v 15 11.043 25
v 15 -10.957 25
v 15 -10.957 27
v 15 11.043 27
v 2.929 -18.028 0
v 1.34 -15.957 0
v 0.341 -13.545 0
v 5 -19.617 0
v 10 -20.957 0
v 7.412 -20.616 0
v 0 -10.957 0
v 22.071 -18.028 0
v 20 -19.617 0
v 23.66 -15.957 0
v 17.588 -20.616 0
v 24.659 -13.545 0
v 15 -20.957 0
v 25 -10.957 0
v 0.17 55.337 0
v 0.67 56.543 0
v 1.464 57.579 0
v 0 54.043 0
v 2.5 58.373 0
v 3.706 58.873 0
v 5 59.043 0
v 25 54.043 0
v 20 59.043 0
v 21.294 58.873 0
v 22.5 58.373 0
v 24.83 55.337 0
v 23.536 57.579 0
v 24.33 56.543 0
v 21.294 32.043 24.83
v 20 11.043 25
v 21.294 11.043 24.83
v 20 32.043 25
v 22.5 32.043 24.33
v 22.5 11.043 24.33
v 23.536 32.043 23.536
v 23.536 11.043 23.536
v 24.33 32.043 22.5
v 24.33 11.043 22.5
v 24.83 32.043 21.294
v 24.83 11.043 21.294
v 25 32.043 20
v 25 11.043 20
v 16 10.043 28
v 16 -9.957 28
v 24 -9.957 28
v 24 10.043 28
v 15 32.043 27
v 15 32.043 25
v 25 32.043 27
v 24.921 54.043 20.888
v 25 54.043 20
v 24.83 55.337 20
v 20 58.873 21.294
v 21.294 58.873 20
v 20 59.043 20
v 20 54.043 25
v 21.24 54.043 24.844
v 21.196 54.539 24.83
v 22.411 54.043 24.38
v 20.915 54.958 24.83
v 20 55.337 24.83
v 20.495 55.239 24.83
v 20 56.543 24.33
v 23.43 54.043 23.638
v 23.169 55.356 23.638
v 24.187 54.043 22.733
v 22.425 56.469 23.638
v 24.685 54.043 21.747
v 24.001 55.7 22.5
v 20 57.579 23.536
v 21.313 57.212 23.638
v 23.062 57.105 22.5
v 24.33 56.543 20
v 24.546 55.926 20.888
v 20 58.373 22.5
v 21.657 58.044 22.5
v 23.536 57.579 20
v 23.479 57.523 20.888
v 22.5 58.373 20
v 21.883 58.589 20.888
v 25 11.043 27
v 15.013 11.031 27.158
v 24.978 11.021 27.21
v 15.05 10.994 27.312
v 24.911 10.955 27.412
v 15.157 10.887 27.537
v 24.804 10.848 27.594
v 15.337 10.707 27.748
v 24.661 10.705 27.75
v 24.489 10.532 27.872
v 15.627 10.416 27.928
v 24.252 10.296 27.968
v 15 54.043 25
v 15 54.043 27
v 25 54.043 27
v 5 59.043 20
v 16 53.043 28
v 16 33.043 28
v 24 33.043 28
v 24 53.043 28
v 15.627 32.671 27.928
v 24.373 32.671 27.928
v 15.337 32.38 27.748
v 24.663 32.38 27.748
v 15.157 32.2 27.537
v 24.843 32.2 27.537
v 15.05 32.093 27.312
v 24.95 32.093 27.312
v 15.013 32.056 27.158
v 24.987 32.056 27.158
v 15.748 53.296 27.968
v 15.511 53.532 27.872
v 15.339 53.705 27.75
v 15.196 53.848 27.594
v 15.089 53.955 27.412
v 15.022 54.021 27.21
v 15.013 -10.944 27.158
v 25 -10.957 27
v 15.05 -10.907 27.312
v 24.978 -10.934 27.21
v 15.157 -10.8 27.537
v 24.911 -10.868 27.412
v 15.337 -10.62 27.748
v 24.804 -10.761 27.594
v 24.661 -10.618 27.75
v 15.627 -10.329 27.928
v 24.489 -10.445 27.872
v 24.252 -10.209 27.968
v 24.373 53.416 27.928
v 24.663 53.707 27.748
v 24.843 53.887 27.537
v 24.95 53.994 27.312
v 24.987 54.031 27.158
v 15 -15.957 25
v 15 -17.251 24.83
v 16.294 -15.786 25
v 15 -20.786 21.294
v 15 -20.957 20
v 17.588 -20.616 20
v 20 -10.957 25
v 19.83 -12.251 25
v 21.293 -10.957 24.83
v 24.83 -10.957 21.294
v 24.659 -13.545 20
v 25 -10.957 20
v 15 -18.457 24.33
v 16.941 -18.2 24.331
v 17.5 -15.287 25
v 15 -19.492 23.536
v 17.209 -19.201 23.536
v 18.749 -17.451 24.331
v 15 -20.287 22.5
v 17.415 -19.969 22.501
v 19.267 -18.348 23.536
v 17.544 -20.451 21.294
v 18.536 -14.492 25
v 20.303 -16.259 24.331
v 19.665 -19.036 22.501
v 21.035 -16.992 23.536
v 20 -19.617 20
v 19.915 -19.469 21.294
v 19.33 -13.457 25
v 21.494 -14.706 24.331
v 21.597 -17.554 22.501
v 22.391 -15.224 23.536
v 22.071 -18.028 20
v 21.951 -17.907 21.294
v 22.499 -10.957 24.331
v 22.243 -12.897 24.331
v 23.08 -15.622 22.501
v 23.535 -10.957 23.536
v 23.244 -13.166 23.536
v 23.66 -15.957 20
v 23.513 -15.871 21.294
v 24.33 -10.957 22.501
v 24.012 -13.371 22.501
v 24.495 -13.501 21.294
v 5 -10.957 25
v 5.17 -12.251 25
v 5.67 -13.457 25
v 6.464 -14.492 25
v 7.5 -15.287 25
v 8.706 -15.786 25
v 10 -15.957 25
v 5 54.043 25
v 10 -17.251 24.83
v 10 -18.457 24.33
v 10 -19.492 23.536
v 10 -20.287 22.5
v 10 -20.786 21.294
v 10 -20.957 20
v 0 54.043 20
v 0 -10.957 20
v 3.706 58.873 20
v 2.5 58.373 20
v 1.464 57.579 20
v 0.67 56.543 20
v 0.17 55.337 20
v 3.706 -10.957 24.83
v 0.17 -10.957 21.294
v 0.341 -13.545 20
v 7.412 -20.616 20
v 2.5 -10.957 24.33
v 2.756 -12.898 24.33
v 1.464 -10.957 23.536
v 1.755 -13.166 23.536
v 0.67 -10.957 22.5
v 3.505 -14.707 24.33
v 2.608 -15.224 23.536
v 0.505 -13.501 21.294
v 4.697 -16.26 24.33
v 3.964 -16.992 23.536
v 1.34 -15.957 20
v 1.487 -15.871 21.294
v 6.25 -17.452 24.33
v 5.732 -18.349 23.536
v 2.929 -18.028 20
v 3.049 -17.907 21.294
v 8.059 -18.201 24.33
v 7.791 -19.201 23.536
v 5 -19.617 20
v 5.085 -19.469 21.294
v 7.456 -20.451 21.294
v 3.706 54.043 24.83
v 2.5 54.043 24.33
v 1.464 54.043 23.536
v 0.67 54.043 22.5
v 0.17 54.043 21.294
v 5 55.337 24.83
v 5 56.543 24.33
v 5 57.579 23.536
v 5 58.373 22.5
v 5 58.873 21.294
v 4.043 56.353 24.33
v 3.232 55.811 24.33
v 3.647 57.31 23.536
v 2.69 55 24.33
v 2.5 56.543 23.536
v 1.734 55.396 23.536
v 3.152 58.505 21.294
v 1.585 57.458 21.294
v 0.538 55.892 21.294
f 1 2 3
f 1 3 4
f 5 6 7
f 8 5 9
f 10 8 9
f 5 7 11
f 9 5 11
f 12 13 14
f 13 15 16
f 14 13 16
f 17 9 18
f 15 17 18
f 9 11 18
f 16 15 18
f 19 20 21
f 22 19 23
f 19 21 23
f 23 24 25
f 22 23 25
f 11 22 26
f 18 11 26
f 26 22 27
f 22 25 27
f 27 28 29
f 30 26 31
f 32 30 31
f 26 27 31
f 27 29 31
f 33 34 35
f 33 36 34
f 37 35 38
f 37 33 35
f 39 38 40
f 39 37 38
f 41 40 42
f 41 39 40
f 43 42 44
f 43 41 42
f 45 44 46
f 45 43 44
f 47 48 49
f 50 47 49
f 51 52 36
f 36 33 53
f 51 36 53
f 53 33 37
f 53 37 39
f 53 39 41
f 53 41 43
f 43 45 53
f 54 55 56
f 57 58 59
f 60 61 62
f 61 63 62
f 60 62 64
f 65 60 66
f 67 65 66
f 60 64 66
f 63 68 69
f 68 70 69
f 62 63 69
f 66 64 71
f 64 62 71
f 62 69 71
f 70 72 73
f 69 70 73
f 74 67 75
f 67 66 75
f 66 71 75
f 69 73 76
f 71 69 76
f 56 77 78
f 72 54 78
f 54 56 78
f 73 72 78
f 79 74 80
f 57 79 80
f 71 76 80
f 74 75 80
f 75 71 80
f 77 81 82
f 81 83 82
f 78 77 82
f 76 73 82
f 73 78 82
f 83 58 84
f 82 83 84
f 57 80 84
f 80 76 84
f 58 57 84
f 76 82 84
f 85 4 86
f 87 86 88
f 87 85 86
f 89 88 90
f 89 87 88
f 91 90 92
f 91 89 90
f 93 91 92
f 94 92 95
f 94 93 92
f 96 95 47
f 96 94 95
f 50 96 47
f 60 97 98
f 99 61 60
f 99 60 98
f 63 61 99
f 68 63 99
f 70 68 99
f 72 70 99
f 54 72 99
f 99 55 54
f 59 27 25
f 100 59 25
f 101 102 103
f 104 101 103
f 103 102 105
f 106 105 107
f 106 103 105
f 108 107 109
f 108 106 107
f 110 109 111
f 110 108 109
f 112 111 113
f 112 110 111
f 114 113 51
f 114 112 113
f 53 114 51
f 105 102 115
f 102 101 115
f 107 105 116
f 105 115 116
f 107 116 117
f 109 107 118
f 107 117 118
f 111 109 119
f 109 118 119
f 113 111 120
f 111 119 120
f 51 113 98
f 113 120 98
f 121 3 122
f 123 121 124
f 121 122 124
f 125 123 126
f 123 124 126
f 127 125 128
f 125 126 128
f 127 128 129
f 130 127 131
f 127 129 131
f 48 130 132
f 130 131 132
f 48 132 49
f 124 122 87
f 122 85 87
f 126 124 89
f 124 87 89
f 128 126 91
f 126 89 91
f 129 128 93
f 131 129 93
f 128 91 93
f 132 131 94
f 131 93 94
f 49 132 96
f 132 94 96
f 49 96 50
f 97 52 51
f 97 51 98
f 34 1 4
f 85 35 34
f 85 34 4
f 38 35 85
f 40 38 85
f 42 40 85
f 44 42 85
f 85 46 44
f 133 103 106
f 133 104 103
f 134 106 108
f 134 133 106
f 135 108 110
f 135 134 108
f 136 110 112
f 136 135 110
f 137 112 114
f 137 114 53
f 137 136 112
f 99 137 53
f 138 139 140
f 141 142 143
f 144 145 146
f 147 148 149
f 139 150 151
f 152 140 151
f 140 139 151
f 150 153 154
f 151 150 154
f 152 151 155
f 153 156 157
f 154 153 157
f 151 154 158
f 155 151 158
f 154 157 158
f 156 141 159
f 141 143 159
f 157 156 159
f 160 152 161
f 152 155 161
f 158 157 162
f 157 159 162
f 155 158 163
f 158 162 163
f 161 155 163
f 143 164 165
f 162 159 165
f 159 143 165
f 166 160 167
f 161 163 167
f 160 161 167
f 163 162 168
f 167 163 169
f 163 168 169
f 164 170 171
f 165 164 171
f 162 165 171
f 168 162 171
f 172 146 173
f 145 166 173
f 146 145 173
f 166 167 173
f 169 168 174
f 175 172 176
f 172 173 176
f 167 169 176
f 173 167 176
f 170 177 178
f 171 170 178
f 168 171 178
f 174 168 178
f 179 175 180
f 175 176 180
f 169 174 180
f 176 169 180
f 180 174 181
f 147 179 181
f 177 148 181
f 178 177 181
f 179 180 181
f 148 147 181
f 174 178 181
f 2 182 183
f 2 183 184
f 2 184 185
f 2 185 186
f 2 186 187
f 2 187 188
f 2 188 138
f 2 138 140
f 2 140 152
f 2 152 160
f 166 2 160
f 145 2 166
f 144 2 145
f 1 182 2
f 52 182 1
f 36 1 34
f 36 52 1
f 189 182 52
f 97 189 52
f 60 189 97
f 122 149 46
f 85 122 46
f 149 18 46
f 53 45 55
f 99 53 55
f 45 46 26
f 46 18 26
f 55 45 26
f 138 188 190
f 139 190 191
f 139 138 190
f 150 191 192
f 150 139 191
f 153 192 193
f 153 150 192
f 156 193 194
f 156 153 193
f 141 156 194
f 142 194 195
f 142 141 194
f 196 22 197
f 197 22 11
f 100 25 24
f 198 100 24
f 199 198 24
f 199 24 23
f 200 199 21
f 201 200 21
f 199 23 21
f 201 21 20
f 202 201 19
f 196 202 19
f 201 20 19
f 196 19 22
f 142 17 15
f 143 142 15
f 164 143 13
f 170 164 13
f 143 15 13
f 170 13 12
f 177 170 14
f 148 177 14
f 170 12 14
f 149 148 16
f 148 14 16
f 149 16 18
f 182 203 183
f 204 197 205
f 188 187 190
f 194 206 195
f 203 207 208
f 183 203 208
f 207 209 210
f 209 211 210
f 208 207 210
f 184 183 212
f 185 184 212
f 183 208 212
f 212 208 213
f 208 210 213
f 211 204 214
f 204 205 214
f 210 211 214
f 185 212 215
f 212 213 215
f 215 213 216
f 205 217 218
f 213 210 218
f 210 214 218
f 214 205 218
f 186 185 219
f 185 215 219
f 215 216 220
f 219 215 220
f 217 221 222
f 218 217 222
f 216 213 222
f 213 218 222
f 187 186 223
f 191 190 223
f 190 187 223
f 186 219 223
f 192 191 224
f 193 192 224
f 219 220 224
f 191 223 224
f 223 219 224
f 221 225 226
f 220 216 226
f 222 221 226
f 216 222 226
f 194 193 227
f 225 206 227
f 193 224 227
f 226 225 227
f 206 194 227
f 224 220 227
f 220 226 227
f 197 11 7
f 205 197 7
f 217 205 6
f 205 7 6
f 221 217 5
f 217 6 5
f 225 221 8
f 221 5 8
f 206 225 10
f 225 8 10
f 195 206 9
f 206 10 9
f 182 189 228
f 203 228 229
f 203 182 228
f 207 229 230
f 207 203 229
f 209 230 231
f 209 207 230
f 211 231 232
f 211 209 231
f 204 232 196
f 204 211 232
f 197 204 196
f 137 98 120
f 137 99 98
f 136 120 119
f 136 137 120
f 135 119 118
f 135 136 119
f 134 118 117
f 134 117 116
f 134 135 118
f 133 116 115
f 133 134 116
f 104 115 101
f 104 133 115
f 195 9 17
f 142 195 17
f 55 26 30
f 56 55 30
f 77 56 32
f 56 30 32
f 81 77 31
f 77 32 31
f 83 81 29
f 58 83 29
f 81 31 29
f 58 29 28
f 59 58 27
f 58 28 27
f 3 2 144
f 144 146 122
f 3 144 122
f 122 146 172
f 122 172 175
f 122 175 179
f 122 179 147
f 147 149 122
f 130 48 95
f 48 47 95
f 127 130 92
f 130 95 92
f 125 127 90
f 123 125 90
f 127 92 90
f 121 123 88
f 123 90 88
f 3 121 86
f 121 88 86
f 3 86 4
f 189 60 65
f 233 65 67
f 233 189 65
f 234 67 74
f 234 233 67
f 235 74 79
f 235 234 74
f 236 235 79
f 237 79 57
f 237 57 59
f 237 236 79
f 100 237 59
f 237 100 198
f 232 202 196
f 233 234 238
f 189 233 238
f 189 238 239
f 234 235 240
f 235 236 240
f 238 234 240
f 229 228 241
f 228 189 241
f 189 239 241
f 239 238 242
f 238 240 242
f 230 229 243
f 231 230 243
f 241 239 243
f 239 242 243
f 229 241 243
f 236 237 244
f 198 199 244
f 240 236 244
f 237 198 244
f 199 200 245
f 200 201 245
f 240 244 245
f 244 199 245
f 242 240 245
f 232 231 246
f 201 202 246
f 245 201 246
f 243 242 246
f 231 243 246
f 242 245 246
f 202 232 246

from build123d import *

# Parameters (mm, degrees)
F1_DEPTH = 25
F2_W     = 10
F2_H     = 22
F3_DEPTH = 3
F4_R     = 4.99999
F5_R     = 1


# Not quite as in the source:
# - a fillet or chamfer is up to 0.001 mm smaller than in the source, because OpenCascade refuses the exact size


with BuildPart() as f1:
    # F0 (on Top) → F1 (new body)
    with BuildSketch(Plane.XY):
        with BuildLine():
            Line((0, 54.0433624494), (0, 53.3714158042))
            Line((0, 53.3714158042), (25, 53.3714158042))
            Line((25, 53.3714158042), (25, 54.0433624494))
            ThreePointArc((25, 54.0433624494), (23.5355339059, 57.5788963554), (20, 59.0433624494))
            Line((20, 59.0433624494), (5, 59.0433624494))
            ThreePointArc((5, 59.0433624494), (1.4644660941, 57.5788963554), (0, 54.0433624494))
        make_face()
        with BuildLine():
            Line((25, 53.3714158042), (0, 53.3714158042))
            Line((0, 53.3714158042), (0, -10.9566375506))
            ThreePointArc((0, -10.9566375506), (2.9289321881, -18.0277053624), (10, -20.9566375506))
            Line((10, -20.9566375506), (15, -20.9566375506))
            ThreePointArc((15, -20.9566375506), (22.0710678119, -18.0277053624), (25, -10.9566375506))
            Line((25, -10.9566375506), (25, 53.3714158042))
        make_face()
    extrude(amount=F1_DEPTH)

    # F2 (on face) → F3 (join)
    with BuildSketch(Plane.XY.offset(25)):
        with Locations((20, 0.0433624494)):
            Rectangle(F2_W, F2_H)
        with Locations((20, 43.0433624494)):
            Rectangle(F2_W, F2_H)
    extrude(amount=F3_DEPTH)

    # F4 (radius 5 in the source; OpenCascade refuses exactly that, so slightly less here)
    f4_edges = [f1.edges().sort_by_distance(p)[0] for p in [
        (25, 21.543362, 25),
        (0, 21.543362, 25),
    ]]
    fillet(f4_edges, radius=F4_R)

    # F5
    f5_edges = [f1.edges().sort_by_distance(p)[0] for p in [
        (15, 0.043362, 28),
        (20, -10.956638, 28),
        (25, 0.043362, 28),
        (20, 11.043362, 28),
        (25, 43.043362, 28),
        (20, 54.043362, 28),
        (15, 43.043362, 28),
        (20, 32.043362, 28),
    ]]
    fillet(f5_edges, radius=F5_R)


solid = f1.part
